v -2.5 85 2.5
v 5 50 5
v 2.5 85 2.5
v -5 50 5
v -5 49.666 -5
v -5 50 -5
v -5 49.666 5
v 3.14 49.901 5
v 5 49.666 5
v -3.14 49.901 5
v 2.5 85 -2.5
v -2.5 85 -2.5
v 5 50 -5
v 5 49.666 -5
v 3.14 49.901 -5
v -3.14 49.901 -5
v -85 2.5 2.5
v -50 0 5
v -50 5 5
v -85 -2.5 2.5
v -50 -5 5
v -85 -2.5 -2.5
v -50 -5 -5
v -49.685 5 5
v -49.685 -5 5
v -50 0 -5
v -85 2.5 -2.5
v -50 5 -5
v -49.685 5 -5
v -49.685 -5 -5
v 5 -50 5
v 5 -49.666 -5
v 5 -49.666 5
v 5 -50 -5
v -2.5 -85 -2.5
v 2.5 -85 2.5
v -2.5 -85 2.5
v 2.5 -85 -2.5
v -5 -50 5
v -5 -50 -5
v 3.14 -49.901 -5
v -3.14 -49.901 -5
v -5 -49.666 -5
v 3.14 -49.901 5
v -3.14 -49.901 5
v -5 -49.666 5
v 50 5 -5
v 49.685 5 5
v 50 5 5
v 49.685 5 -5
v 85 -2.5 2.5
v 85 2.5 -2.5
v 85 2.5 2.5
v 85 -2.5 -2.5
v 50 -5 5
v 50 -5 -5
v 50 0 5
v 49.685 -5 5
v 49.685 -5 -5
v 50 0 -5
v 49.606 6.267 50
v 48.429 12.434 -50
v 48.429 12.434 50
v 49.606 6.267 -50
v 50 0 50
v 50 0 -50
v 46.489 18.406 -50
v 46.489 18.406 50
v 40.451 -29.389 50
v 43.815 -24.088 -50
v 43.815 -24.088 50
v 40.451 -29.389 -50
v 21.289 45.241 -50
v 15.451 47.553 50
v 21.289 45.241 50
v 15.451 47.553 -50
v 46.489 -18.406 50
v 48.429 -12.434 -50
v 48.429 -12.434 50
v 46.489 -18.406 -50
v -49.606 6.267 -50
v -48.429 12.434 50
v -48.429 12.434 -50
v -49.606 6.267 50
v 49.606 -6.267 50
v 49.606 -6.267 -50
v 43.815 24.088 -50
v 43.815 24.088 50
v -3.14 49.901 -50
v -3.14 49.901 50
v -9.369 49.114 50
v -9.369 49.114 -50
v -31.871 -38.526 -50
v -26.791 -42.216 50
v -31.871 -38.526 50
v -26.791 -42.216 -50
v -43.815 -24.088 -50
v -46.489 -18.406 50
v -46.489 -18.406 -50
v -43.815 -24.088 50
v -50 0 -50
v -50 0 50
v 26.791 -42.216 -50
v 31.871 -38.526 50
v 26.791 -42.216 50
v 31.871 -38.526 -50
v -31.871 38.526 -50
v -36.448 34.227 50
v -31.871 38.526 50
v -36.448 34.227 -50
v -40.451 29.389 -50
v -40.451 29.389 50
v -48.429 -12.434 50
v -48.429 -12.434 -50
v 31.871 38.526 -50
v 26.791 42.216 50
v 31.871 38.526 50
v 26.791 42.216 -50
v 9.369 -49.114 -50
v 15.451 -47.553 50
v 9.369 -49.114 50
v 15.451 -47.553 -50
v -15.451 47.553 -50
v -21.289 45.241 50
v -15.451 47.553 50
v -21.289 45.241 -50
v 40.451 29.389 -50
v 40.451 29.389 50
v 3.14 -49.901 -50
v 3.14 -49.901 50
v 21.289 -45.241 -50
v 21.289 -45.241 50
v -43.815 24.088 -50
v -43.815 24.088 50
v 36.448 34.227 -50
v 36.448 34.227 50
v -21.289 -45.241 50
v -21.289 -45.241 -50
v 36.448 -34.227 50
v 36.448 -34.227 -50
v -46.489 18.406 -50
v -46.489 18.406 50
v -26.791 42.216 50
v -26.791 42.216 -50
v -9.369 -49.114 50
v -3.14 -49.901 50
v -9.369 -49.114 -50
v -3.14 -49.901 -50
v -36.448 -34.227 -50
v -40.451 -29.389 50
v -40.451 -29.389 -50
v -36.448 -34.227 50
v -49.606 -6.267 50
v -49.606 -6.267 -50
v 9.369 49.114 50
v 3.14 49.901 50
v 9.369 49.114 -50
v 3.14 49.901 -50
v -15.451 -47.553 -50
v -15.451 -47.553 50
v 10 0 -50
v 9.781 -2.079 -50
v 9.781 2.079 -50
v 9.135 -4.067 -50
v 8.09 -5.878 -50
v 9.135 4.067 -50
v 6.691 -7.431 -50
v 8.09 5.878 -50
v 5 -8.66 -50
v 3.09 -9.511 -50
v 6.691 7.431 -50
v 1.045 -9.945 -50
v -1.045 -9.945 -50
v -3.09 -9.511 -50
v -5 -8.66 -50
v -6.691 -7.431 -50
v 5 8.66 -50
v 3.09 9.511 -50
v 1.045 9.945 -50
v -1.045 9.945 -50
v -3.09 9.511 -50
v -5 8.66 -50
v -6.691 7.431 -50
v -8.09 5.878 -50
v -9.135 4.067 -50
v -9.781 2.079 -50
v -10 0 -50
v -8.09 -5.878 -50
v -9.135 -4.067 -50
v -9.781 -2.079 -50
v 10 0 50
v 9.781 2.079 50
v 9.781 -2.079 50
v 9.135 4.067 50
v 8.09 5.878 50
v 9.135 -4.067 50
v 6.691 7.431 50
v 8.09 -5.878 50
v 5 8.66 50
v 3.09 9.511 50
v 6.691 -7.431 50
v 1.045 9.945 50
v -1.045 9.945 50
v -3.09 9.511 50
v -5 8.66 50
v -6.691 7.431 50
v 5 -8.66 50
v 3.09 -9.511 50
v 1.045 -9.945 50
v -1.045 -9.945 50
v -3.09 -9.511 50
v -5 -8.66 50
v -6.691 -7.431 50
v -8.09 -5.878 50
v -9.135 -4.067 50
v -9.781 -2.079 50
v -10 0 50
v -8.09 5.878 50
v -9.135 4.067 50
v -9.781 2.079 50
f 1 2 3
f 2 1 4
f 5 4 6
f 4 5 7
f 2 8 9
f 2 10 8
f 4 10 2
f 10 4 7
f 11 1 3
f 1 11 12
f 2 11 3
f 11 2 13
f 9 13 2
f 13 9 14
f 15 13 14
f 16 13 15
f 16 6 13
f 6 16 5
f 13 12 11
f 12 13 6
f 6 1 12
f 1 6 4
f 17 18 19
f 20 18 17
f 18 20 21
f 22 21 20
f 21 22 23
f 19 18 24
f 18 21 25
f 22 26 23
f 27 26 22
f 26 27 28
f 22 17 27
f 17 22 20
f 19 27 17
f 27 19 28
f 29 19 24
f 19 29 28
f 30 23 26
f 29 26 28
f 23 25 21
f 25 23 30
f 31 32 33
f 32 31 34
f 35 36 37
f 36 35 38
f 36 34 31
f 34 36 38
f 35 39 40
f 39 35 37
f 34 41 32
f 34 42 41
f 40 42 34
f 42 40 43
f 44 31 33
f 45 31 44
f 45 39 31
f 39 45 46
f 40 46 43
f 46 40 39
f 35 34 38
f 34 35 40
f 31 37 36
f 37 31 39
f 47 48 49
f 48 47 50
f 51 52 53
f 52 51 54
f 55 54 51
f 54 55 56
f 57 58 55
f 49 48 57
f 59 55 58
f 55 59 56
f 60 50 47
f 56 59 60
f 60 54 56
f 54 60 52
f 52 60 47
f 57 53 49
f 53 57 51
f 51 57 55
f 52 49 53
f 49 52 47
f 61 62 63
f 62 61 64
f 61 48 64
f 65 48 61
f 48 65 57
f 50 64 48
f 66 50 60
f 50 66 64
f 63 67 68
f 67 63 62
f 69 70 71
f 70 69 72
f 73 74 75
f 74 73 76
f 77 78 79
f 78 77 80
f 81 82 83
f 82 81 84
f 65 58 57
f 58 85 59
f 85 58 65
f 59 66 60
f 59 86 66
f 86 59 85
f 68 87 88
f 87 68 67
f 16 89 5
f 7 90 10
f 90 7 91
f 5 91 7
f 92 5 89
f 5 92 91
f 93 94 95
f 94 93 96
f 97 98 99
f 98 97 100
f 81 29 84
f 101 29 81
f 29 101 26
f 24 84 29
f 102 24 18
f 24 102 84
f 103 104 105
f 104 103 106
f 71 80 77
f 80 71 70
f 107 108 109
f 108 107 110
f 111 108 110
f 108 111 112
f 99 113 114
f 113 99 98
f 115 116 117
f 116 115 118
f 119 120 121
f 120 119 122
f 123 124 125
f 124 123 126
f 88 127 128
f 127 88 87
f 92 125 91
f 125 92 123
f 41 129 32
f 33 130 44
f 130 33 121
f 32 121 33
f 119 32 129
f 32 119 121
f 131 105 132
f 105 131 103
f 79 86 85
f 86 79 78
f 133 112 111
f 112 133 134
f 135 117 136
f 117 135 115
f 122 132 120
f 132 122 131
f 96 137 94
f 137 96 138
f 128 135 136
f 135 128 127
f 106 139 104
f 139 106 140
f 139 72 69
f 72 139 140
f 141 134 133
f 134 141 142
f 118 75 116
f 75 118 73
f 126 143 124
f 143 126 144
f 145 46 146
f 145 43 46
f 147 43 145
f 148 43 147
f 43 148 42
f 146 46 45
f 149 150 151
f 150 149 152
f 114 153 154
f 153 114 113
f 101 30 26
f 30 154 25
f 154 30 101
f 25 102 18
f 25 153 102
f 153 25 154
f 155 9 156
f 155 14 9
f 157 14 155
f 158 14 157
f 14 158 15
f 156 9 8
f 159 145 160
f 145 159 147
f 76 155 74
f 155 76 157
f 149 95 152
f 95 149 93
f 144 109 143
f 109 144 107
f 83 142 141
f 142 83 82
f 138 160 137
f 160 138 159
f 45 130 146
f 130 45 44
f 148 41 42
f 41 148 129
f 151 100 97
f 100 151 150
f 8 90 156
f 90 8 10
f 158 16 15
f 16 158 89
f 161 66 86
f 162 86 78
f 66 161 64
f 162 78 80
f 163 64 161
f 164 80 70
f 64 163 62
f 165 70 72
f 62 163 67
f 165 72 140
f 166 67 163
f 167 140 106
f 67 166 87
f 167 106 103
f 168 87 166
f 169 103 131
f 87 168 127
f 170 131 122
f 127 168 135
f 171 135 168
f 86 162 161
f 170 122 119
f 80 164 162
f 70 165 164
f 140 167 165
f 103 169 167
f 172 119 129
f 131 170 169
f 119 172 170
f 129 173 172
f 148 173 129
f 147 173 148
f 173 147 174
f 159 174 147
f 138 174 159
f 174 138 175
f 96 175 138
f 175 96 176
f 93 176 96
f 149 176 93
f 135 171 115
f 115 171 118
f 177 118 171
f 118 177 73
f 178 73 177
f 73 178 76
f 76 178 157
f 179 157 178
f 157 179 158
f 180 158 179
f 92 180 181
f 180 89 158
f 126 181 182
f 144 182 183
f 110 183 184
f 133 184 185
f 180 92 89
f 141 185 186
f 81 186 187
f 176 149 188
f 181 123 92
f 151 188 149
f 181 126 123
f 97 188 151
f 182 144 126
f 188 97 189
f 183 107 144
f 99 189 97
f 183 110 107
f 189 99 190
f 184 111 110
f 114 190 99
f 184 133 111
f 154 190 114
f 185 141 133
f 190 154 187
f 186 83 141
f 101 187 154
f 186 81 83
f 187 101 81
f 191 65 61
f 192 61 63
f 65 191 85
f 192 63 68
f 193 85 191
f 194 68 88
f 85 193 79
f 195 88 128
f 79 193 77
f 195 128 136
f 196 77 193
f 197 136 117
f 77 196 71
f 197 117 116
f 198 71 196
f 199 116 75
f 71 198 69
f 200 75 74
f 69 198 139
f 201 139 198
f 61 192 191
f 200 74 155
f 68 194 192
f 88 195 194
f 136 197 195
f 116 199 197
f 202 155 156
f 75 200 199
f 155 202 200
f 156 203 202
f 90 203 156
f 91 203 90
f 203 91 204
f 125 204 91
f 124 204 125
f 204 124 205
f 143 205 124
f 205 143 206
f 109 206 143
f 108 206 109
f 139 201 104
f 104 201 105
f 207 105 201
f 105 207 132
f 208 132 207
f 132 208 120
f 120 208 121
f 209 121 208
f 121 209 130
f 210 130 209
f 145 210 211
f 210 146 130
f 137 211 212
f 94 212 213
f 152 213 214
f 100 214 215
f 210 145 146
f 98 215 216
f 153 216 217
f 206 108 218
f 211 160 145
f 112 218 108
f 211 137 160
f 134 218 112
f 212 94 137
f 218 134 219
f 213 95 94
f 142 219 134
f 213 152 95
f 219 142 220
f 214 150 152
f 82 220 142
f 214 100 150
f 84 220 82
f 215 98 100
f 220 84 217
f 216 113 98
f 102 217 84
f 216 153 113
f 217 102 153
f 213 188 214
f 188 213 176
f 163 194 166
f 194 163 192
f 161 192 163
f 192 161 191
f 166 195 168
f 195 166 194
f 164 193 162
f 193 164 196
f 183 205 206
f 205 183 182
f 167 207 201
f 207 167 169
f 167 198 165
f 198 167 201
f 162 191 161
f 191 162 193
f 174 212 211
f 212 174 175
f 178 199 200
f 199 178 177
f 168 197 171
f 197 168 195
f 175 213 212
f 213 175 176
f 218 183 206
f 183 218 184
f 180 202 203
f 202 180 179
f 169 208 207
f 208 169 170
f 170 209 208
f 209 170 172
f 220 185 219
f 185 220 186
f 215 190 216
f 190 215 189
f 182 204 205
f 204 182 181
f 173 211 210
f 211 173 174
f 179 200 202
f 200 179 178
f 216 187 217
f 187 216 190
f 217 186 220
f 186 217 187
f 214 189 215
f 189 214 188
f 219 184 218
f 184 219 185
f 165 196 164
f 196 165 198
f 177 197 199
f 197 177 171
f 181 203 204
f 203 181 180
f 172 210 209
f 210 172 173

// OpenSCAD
// InspectorBot Propeller Mesh

module propeller() {
    difference() {
        // Main propeller body
        union() {
            // Cylindrical base
            cylinder(h=100, r=50, center=true, $fn=50);
            
            // Blade-like extensions
            for (i = [0:3]) {
                rotate([0, 0, i * 90]) {
                    translate([0, 40, 0]) {
                        // Blade shape
                        hull() {
                            cube([10, 20, 10], center=true);
                            translate([0, 40, 0]) 
                                cube([5, 10, 5], center=true);
                        }
                    }
                }
            }
        }
        
        // Central hole for mounting
        cylinder(h=110, r=10, center=true, $fn=30);
    }
}

// Render and export
propeller();
